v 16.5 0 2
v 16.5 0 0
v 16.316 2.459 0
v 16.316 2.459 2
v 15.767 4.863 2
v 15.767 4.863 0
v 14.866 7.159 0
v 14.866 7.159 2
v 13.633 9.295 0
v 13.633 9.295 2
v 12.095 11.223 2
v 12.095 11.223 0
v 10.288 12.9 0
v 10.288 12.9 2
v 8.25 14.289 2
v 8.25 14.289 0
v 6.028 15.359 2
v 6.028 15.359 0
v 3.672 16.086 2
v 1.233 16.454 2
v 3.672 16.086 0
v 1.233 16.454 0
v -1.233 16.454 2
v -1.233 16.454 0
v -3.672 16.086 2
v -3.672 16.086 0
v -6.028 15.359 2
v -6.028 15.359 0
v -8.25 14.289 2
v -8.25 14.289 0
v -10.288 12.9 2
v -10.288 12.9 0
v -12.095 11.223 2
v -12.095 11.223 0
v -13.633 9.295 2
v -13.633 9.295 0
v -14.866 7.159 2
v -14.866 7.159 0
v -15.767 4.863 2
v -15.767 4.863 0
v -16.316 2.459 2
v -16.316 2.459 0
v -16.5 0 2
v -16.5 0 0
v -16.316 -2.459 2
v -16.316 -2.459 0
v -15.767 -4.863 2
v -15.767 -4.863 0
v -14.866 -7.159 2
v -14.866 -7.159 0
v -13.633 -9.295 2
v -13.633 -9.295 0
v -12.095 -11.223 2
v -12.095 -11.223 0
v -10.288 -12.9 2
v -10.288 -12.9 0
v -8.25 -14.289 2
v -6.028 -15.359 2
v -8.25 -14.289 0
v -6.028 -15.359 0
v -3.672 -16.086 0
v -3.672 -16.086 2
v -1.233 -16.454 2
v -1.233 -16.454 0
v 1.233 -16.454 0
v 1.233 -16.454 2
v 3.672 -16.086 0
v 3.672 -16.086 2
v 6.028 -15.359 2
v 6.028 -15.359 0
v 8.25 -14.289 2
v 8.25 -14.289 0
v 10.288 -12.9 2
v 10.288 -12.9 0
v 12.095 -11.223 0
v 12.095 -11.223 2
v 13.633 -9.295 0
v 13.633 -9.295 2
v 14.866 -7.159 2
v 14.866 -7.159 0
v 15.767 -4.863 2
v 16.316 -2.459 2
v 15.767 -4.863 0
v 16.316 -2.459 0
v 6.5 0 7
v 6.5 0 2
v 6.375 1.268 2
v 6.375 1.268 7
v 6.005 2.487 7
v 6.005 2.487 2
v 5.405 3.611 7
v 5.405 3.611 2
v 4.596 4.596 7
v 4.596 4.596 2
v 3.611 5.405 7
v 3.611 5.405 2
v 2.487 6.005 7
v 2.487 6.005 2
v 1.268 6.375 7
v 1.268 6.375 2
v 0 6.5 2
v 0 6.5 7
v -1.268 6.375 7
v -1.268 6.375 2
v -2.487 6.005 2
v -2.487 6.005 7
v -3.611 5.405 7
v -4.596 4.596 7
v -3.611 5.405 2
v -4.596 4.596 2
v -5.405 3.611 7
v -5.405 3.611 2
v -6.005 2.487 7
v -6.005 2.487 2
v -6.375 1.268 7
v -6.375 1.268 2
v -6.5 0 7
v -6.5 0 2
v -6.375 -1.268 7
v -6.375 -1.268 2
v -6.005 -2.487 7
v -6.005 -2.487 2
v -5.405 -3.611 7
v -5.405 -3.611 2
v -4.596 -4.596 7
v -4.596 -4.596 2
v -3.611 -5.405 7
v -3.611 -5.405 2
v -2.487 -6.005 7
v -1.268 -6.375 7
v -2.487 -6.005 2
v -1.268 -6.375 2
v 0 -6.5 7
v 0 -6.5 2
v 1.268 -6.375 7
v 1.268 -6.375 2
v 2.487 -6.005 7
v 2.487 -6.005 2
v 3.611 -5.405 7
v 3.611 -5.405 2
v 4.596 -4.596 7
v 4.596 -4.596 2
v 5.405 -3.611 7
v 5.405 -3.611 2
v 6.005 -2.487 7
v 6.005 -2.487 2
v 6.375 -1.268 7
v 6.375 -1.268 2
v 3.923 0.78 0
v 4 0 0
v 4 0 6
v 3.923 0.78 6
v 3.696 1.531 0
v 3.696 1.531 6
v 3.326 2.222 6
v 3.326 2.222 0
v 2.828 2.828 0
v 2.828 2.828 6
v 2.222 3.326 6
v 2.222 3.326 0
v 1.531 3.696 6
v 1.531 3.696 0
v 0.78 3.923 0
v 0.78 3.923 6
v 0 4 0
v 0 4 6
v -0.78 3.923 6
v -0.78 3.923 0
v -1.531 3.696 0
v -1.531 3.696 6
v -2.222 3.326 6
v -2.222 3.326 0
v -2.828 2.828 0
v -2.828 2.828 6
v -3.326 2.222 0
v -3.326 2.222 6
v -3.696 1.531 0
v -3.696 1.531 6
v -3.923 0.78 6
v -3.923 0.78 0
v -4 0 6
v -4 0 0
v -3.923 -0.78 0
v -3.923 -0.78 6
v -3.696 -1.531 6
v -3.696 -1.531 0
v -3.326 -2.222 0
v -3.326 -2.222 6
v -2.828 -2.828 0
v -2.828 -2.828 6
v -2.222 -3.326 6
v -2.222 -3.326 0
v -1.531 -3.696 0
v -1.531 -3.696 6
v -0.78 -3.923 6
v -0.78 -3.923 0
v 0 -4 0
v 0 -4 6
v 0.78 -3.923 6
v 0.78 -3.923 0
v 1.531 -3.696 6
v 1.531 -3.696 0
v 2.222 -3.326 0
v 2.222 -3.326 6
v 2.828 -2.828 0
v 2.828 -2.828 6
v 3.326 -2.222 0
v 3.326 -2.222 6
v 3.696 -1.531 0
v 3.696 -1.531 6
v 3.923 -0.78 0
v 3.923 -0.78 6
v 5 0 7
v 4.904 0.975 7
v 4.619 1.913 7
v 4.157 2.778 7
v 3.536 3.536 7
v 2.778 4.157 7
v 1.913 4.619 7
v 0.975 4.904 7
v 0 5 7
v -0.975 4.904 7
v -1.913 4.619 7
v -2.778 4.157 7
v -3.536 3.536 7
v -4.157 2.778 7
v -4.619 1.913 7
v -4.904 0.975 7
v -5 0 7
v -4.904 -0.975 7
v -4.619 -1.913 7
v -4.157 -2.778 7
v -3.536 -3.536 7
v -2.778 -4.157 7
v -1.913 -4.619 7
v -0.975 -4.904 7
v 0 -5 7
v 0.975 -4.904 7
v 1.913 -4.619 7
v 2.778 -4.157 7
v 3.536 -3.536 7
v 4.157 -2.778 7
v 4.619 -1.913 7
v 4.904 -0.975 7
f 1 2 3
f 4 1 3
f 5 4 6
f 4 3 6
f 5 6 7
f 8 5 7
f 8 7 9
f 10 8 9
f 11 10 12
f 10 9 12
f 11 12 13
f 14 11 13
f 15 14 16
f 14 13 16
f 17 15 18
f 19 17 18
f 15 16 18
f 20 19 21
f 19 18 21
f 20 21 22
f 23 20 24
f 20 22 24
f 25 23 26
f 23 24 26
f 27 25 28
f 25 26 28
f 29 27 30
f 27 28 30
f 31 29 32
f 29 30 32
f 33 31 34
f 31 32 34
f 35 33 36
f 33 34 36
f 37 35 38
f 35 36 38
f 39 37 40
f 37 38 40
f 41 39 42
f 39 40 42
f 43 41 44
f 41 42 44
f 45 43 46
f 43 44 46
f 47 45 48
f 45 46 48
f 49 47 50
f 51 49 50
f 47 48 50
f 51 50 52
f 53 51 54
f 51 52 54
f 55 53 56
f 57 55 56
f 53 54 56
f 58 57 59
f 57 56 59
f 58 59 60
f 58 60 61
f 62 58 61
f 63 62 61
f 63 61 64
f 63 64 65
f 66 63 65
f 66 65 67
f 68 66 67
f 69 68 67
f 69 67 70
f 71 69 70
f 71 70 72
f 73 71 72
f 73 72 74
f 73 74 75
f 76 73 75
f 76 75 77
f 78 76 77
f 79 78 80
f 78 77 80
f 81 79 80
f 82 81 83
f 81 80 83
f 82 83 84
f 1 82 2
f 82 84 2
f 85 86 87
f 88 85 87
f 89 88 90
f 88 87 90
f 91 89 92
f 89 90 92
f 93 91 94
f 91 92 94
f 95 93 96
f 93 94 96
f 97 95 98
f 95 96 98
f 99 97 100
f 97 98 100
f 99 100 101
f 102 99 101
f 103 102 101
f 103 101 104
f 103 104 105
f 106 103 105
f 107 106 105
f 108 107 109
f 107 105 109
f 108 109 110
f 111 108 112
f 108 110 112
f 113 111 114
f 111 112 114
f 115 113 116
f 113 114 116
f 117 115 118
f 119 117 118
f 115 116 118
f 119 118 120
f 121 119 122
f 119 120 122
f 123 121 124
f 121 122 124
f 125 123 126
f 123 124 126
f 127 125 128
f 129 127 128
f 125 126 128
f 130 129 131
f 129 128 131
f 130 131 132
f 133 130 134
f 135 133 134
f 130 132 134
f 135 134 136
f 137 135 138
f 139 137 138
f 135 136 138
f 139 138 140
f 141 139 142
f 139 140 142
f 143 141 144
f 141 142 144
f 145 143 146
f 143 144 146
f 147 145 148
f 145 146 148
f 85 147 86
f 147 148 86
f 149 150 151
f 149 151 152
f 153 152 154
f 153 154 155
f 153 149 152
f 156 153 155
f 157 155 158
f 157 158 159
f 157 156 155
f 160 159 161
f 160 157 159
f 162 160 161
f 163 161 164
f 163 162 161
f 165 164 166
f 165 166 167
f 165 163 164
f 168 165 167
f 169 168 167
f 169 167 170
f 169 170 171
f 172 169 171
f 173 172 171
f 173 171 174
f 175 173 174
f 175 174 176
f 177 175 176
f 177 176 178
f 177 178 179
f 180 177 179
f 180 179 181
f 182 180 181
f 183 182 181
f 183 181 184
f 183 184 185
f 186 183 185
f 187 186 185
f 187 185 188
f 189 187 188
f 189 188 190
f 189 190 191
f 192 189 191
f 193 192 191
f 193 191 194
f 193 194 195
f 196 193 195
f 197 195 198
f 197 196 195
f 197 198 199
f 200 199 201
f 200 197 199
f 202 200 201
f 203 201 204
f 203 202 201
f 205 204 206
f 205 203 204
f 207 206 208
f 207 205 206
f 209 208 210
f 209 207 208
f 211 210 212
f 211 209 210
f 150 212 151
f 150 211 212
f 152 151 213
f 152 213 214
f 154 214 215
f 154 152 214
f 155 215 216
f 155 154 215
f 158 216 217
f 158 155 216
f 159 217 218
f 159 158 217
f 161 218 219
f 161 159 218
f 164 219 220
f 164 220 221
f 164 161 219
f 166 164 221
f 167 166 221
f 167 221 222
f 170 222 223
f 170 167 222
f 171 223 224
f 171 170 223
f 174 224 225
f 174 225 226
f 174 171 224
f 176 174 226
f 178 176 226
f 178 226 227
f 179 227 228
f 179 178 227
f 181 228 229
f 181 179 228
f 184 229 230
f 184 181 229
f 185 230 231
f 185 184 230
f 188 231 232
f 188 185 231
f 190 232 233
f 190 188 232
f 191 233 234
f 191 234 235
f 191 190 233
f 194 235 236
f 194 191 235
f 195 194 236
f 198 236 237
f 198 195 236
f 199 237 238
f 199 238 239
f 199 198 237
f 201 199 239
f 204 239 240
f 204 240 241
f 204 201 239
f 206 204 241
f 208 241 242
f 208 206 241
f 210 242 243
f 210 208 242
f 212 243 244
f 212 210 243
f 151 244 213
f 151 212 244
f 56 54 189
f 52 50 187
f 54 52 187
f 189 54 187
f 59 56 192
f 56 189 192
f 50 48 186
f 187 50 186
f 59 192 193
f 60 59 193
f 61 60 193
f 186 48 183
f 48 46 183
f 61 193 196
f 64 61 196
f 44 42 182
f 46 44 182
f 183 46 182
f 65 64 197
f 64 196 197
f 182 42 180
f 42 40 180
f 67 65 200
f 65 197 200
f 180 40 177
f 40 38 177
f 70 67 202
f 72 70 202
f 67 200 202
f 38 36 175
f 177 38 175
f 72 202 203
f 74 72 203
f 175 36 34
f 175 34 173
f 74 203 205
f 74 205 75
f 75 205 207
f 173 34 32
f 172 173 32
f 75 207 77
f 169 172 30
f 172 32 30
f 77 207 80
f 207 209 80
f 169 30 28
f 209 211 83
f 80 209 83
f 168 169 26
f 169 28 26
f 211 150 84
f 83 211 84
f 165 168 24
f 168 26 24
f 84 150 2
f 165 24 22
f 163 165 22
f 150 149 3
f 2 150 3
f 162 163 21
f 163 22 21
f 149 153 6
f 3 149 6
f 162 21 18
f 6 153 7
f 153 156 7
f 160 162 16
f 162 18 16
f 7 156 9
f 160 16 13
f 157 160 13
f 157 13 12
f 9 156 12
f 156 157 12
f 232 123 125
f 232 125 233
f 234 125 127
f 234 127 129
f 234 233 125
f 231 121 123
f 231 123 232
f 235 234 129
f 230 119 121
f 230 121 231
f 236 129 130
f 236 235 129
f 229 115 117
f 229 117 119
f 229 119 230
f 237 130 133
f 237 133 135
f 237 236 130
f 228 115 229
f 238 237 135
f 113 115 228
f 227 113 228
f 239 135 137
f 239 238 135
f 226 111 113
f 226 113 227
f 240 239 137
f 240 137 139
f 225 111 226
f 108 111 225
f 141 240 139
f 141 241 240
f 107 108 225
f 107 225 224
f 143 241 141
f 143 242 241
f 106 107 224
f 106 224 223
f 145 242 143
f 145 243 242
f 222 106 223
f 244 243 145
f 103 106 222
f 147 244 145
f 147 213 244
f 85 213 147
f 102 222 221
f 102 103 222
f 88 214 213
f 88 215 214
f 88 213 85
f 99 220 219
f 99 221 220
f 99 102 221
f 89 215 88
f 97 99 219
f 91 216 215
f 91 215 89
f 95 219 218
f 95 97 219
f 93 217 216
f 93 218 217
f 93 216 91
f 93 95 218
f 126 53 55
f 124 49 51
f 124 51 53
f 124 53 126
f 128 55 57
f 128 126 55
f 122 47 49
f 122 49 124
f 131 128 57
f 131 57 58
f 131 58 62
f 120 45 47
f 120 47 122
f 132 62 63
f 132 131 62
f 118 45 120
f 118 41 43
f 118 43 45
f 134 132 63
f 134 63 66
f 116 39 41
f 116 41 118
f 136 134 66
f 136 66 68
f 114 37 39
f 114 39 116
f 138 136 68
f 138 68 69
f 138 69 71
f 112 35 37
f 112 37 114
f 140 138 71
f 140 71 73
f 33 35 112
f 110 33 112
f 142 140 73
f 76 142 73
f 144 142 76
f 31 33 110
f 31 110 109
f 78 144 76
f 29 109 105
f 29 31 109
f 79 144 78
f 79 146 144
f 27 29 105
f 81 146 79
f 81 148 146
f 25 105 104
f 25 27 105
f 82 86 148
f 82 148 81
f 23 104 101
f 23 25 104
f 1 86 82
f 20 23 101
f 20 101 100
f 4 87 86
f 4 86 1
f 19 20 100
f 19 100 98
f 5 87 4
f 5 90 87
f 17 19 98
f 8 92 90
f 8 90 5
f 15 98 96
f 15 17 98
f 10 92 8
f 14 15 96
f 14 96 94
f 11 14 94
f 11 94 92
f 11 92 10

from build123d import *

# Parameters (mm, degrees)
SKETCH_R      = 16.5
SKETCH_R_2    = 4
PAD_DEPTH     = 2
SKETCH001_R   = 6.5
SKETCH001_R_2 = 4
PAD001_DEPTH  = 5
CHAMFER_SIZE  = 1


with BuildPart() as part:
    # Sketch → Pad (new body)
    with BuildSketch(Plane.XY):
        Circle(SKETCH_R)
        Circle(SKETCH_R_2, mode=Mode.SUBTRACT)
    extrude(amount=PAD_DEPTH)

    # Sketch001 (on Face4 of Pad) → Pad001 (join)
    with BuildSketch(Plane.XY.offset(2)):
        Circle(SKETCH001_R)
        Circle(SKETCH001_R_2, mode=Mode.SUBTRACT)
    extrude(amount=PAD001_DEPTH)

    # Chamfer
    chamfer_edges = [part.edges().sort_by_distance(p)[0] for p in [
        (-4, 0, 7),
    ]]
    chamfer(chamfer_edges, length=CHAMFER_SIZE)


solid = part.part
